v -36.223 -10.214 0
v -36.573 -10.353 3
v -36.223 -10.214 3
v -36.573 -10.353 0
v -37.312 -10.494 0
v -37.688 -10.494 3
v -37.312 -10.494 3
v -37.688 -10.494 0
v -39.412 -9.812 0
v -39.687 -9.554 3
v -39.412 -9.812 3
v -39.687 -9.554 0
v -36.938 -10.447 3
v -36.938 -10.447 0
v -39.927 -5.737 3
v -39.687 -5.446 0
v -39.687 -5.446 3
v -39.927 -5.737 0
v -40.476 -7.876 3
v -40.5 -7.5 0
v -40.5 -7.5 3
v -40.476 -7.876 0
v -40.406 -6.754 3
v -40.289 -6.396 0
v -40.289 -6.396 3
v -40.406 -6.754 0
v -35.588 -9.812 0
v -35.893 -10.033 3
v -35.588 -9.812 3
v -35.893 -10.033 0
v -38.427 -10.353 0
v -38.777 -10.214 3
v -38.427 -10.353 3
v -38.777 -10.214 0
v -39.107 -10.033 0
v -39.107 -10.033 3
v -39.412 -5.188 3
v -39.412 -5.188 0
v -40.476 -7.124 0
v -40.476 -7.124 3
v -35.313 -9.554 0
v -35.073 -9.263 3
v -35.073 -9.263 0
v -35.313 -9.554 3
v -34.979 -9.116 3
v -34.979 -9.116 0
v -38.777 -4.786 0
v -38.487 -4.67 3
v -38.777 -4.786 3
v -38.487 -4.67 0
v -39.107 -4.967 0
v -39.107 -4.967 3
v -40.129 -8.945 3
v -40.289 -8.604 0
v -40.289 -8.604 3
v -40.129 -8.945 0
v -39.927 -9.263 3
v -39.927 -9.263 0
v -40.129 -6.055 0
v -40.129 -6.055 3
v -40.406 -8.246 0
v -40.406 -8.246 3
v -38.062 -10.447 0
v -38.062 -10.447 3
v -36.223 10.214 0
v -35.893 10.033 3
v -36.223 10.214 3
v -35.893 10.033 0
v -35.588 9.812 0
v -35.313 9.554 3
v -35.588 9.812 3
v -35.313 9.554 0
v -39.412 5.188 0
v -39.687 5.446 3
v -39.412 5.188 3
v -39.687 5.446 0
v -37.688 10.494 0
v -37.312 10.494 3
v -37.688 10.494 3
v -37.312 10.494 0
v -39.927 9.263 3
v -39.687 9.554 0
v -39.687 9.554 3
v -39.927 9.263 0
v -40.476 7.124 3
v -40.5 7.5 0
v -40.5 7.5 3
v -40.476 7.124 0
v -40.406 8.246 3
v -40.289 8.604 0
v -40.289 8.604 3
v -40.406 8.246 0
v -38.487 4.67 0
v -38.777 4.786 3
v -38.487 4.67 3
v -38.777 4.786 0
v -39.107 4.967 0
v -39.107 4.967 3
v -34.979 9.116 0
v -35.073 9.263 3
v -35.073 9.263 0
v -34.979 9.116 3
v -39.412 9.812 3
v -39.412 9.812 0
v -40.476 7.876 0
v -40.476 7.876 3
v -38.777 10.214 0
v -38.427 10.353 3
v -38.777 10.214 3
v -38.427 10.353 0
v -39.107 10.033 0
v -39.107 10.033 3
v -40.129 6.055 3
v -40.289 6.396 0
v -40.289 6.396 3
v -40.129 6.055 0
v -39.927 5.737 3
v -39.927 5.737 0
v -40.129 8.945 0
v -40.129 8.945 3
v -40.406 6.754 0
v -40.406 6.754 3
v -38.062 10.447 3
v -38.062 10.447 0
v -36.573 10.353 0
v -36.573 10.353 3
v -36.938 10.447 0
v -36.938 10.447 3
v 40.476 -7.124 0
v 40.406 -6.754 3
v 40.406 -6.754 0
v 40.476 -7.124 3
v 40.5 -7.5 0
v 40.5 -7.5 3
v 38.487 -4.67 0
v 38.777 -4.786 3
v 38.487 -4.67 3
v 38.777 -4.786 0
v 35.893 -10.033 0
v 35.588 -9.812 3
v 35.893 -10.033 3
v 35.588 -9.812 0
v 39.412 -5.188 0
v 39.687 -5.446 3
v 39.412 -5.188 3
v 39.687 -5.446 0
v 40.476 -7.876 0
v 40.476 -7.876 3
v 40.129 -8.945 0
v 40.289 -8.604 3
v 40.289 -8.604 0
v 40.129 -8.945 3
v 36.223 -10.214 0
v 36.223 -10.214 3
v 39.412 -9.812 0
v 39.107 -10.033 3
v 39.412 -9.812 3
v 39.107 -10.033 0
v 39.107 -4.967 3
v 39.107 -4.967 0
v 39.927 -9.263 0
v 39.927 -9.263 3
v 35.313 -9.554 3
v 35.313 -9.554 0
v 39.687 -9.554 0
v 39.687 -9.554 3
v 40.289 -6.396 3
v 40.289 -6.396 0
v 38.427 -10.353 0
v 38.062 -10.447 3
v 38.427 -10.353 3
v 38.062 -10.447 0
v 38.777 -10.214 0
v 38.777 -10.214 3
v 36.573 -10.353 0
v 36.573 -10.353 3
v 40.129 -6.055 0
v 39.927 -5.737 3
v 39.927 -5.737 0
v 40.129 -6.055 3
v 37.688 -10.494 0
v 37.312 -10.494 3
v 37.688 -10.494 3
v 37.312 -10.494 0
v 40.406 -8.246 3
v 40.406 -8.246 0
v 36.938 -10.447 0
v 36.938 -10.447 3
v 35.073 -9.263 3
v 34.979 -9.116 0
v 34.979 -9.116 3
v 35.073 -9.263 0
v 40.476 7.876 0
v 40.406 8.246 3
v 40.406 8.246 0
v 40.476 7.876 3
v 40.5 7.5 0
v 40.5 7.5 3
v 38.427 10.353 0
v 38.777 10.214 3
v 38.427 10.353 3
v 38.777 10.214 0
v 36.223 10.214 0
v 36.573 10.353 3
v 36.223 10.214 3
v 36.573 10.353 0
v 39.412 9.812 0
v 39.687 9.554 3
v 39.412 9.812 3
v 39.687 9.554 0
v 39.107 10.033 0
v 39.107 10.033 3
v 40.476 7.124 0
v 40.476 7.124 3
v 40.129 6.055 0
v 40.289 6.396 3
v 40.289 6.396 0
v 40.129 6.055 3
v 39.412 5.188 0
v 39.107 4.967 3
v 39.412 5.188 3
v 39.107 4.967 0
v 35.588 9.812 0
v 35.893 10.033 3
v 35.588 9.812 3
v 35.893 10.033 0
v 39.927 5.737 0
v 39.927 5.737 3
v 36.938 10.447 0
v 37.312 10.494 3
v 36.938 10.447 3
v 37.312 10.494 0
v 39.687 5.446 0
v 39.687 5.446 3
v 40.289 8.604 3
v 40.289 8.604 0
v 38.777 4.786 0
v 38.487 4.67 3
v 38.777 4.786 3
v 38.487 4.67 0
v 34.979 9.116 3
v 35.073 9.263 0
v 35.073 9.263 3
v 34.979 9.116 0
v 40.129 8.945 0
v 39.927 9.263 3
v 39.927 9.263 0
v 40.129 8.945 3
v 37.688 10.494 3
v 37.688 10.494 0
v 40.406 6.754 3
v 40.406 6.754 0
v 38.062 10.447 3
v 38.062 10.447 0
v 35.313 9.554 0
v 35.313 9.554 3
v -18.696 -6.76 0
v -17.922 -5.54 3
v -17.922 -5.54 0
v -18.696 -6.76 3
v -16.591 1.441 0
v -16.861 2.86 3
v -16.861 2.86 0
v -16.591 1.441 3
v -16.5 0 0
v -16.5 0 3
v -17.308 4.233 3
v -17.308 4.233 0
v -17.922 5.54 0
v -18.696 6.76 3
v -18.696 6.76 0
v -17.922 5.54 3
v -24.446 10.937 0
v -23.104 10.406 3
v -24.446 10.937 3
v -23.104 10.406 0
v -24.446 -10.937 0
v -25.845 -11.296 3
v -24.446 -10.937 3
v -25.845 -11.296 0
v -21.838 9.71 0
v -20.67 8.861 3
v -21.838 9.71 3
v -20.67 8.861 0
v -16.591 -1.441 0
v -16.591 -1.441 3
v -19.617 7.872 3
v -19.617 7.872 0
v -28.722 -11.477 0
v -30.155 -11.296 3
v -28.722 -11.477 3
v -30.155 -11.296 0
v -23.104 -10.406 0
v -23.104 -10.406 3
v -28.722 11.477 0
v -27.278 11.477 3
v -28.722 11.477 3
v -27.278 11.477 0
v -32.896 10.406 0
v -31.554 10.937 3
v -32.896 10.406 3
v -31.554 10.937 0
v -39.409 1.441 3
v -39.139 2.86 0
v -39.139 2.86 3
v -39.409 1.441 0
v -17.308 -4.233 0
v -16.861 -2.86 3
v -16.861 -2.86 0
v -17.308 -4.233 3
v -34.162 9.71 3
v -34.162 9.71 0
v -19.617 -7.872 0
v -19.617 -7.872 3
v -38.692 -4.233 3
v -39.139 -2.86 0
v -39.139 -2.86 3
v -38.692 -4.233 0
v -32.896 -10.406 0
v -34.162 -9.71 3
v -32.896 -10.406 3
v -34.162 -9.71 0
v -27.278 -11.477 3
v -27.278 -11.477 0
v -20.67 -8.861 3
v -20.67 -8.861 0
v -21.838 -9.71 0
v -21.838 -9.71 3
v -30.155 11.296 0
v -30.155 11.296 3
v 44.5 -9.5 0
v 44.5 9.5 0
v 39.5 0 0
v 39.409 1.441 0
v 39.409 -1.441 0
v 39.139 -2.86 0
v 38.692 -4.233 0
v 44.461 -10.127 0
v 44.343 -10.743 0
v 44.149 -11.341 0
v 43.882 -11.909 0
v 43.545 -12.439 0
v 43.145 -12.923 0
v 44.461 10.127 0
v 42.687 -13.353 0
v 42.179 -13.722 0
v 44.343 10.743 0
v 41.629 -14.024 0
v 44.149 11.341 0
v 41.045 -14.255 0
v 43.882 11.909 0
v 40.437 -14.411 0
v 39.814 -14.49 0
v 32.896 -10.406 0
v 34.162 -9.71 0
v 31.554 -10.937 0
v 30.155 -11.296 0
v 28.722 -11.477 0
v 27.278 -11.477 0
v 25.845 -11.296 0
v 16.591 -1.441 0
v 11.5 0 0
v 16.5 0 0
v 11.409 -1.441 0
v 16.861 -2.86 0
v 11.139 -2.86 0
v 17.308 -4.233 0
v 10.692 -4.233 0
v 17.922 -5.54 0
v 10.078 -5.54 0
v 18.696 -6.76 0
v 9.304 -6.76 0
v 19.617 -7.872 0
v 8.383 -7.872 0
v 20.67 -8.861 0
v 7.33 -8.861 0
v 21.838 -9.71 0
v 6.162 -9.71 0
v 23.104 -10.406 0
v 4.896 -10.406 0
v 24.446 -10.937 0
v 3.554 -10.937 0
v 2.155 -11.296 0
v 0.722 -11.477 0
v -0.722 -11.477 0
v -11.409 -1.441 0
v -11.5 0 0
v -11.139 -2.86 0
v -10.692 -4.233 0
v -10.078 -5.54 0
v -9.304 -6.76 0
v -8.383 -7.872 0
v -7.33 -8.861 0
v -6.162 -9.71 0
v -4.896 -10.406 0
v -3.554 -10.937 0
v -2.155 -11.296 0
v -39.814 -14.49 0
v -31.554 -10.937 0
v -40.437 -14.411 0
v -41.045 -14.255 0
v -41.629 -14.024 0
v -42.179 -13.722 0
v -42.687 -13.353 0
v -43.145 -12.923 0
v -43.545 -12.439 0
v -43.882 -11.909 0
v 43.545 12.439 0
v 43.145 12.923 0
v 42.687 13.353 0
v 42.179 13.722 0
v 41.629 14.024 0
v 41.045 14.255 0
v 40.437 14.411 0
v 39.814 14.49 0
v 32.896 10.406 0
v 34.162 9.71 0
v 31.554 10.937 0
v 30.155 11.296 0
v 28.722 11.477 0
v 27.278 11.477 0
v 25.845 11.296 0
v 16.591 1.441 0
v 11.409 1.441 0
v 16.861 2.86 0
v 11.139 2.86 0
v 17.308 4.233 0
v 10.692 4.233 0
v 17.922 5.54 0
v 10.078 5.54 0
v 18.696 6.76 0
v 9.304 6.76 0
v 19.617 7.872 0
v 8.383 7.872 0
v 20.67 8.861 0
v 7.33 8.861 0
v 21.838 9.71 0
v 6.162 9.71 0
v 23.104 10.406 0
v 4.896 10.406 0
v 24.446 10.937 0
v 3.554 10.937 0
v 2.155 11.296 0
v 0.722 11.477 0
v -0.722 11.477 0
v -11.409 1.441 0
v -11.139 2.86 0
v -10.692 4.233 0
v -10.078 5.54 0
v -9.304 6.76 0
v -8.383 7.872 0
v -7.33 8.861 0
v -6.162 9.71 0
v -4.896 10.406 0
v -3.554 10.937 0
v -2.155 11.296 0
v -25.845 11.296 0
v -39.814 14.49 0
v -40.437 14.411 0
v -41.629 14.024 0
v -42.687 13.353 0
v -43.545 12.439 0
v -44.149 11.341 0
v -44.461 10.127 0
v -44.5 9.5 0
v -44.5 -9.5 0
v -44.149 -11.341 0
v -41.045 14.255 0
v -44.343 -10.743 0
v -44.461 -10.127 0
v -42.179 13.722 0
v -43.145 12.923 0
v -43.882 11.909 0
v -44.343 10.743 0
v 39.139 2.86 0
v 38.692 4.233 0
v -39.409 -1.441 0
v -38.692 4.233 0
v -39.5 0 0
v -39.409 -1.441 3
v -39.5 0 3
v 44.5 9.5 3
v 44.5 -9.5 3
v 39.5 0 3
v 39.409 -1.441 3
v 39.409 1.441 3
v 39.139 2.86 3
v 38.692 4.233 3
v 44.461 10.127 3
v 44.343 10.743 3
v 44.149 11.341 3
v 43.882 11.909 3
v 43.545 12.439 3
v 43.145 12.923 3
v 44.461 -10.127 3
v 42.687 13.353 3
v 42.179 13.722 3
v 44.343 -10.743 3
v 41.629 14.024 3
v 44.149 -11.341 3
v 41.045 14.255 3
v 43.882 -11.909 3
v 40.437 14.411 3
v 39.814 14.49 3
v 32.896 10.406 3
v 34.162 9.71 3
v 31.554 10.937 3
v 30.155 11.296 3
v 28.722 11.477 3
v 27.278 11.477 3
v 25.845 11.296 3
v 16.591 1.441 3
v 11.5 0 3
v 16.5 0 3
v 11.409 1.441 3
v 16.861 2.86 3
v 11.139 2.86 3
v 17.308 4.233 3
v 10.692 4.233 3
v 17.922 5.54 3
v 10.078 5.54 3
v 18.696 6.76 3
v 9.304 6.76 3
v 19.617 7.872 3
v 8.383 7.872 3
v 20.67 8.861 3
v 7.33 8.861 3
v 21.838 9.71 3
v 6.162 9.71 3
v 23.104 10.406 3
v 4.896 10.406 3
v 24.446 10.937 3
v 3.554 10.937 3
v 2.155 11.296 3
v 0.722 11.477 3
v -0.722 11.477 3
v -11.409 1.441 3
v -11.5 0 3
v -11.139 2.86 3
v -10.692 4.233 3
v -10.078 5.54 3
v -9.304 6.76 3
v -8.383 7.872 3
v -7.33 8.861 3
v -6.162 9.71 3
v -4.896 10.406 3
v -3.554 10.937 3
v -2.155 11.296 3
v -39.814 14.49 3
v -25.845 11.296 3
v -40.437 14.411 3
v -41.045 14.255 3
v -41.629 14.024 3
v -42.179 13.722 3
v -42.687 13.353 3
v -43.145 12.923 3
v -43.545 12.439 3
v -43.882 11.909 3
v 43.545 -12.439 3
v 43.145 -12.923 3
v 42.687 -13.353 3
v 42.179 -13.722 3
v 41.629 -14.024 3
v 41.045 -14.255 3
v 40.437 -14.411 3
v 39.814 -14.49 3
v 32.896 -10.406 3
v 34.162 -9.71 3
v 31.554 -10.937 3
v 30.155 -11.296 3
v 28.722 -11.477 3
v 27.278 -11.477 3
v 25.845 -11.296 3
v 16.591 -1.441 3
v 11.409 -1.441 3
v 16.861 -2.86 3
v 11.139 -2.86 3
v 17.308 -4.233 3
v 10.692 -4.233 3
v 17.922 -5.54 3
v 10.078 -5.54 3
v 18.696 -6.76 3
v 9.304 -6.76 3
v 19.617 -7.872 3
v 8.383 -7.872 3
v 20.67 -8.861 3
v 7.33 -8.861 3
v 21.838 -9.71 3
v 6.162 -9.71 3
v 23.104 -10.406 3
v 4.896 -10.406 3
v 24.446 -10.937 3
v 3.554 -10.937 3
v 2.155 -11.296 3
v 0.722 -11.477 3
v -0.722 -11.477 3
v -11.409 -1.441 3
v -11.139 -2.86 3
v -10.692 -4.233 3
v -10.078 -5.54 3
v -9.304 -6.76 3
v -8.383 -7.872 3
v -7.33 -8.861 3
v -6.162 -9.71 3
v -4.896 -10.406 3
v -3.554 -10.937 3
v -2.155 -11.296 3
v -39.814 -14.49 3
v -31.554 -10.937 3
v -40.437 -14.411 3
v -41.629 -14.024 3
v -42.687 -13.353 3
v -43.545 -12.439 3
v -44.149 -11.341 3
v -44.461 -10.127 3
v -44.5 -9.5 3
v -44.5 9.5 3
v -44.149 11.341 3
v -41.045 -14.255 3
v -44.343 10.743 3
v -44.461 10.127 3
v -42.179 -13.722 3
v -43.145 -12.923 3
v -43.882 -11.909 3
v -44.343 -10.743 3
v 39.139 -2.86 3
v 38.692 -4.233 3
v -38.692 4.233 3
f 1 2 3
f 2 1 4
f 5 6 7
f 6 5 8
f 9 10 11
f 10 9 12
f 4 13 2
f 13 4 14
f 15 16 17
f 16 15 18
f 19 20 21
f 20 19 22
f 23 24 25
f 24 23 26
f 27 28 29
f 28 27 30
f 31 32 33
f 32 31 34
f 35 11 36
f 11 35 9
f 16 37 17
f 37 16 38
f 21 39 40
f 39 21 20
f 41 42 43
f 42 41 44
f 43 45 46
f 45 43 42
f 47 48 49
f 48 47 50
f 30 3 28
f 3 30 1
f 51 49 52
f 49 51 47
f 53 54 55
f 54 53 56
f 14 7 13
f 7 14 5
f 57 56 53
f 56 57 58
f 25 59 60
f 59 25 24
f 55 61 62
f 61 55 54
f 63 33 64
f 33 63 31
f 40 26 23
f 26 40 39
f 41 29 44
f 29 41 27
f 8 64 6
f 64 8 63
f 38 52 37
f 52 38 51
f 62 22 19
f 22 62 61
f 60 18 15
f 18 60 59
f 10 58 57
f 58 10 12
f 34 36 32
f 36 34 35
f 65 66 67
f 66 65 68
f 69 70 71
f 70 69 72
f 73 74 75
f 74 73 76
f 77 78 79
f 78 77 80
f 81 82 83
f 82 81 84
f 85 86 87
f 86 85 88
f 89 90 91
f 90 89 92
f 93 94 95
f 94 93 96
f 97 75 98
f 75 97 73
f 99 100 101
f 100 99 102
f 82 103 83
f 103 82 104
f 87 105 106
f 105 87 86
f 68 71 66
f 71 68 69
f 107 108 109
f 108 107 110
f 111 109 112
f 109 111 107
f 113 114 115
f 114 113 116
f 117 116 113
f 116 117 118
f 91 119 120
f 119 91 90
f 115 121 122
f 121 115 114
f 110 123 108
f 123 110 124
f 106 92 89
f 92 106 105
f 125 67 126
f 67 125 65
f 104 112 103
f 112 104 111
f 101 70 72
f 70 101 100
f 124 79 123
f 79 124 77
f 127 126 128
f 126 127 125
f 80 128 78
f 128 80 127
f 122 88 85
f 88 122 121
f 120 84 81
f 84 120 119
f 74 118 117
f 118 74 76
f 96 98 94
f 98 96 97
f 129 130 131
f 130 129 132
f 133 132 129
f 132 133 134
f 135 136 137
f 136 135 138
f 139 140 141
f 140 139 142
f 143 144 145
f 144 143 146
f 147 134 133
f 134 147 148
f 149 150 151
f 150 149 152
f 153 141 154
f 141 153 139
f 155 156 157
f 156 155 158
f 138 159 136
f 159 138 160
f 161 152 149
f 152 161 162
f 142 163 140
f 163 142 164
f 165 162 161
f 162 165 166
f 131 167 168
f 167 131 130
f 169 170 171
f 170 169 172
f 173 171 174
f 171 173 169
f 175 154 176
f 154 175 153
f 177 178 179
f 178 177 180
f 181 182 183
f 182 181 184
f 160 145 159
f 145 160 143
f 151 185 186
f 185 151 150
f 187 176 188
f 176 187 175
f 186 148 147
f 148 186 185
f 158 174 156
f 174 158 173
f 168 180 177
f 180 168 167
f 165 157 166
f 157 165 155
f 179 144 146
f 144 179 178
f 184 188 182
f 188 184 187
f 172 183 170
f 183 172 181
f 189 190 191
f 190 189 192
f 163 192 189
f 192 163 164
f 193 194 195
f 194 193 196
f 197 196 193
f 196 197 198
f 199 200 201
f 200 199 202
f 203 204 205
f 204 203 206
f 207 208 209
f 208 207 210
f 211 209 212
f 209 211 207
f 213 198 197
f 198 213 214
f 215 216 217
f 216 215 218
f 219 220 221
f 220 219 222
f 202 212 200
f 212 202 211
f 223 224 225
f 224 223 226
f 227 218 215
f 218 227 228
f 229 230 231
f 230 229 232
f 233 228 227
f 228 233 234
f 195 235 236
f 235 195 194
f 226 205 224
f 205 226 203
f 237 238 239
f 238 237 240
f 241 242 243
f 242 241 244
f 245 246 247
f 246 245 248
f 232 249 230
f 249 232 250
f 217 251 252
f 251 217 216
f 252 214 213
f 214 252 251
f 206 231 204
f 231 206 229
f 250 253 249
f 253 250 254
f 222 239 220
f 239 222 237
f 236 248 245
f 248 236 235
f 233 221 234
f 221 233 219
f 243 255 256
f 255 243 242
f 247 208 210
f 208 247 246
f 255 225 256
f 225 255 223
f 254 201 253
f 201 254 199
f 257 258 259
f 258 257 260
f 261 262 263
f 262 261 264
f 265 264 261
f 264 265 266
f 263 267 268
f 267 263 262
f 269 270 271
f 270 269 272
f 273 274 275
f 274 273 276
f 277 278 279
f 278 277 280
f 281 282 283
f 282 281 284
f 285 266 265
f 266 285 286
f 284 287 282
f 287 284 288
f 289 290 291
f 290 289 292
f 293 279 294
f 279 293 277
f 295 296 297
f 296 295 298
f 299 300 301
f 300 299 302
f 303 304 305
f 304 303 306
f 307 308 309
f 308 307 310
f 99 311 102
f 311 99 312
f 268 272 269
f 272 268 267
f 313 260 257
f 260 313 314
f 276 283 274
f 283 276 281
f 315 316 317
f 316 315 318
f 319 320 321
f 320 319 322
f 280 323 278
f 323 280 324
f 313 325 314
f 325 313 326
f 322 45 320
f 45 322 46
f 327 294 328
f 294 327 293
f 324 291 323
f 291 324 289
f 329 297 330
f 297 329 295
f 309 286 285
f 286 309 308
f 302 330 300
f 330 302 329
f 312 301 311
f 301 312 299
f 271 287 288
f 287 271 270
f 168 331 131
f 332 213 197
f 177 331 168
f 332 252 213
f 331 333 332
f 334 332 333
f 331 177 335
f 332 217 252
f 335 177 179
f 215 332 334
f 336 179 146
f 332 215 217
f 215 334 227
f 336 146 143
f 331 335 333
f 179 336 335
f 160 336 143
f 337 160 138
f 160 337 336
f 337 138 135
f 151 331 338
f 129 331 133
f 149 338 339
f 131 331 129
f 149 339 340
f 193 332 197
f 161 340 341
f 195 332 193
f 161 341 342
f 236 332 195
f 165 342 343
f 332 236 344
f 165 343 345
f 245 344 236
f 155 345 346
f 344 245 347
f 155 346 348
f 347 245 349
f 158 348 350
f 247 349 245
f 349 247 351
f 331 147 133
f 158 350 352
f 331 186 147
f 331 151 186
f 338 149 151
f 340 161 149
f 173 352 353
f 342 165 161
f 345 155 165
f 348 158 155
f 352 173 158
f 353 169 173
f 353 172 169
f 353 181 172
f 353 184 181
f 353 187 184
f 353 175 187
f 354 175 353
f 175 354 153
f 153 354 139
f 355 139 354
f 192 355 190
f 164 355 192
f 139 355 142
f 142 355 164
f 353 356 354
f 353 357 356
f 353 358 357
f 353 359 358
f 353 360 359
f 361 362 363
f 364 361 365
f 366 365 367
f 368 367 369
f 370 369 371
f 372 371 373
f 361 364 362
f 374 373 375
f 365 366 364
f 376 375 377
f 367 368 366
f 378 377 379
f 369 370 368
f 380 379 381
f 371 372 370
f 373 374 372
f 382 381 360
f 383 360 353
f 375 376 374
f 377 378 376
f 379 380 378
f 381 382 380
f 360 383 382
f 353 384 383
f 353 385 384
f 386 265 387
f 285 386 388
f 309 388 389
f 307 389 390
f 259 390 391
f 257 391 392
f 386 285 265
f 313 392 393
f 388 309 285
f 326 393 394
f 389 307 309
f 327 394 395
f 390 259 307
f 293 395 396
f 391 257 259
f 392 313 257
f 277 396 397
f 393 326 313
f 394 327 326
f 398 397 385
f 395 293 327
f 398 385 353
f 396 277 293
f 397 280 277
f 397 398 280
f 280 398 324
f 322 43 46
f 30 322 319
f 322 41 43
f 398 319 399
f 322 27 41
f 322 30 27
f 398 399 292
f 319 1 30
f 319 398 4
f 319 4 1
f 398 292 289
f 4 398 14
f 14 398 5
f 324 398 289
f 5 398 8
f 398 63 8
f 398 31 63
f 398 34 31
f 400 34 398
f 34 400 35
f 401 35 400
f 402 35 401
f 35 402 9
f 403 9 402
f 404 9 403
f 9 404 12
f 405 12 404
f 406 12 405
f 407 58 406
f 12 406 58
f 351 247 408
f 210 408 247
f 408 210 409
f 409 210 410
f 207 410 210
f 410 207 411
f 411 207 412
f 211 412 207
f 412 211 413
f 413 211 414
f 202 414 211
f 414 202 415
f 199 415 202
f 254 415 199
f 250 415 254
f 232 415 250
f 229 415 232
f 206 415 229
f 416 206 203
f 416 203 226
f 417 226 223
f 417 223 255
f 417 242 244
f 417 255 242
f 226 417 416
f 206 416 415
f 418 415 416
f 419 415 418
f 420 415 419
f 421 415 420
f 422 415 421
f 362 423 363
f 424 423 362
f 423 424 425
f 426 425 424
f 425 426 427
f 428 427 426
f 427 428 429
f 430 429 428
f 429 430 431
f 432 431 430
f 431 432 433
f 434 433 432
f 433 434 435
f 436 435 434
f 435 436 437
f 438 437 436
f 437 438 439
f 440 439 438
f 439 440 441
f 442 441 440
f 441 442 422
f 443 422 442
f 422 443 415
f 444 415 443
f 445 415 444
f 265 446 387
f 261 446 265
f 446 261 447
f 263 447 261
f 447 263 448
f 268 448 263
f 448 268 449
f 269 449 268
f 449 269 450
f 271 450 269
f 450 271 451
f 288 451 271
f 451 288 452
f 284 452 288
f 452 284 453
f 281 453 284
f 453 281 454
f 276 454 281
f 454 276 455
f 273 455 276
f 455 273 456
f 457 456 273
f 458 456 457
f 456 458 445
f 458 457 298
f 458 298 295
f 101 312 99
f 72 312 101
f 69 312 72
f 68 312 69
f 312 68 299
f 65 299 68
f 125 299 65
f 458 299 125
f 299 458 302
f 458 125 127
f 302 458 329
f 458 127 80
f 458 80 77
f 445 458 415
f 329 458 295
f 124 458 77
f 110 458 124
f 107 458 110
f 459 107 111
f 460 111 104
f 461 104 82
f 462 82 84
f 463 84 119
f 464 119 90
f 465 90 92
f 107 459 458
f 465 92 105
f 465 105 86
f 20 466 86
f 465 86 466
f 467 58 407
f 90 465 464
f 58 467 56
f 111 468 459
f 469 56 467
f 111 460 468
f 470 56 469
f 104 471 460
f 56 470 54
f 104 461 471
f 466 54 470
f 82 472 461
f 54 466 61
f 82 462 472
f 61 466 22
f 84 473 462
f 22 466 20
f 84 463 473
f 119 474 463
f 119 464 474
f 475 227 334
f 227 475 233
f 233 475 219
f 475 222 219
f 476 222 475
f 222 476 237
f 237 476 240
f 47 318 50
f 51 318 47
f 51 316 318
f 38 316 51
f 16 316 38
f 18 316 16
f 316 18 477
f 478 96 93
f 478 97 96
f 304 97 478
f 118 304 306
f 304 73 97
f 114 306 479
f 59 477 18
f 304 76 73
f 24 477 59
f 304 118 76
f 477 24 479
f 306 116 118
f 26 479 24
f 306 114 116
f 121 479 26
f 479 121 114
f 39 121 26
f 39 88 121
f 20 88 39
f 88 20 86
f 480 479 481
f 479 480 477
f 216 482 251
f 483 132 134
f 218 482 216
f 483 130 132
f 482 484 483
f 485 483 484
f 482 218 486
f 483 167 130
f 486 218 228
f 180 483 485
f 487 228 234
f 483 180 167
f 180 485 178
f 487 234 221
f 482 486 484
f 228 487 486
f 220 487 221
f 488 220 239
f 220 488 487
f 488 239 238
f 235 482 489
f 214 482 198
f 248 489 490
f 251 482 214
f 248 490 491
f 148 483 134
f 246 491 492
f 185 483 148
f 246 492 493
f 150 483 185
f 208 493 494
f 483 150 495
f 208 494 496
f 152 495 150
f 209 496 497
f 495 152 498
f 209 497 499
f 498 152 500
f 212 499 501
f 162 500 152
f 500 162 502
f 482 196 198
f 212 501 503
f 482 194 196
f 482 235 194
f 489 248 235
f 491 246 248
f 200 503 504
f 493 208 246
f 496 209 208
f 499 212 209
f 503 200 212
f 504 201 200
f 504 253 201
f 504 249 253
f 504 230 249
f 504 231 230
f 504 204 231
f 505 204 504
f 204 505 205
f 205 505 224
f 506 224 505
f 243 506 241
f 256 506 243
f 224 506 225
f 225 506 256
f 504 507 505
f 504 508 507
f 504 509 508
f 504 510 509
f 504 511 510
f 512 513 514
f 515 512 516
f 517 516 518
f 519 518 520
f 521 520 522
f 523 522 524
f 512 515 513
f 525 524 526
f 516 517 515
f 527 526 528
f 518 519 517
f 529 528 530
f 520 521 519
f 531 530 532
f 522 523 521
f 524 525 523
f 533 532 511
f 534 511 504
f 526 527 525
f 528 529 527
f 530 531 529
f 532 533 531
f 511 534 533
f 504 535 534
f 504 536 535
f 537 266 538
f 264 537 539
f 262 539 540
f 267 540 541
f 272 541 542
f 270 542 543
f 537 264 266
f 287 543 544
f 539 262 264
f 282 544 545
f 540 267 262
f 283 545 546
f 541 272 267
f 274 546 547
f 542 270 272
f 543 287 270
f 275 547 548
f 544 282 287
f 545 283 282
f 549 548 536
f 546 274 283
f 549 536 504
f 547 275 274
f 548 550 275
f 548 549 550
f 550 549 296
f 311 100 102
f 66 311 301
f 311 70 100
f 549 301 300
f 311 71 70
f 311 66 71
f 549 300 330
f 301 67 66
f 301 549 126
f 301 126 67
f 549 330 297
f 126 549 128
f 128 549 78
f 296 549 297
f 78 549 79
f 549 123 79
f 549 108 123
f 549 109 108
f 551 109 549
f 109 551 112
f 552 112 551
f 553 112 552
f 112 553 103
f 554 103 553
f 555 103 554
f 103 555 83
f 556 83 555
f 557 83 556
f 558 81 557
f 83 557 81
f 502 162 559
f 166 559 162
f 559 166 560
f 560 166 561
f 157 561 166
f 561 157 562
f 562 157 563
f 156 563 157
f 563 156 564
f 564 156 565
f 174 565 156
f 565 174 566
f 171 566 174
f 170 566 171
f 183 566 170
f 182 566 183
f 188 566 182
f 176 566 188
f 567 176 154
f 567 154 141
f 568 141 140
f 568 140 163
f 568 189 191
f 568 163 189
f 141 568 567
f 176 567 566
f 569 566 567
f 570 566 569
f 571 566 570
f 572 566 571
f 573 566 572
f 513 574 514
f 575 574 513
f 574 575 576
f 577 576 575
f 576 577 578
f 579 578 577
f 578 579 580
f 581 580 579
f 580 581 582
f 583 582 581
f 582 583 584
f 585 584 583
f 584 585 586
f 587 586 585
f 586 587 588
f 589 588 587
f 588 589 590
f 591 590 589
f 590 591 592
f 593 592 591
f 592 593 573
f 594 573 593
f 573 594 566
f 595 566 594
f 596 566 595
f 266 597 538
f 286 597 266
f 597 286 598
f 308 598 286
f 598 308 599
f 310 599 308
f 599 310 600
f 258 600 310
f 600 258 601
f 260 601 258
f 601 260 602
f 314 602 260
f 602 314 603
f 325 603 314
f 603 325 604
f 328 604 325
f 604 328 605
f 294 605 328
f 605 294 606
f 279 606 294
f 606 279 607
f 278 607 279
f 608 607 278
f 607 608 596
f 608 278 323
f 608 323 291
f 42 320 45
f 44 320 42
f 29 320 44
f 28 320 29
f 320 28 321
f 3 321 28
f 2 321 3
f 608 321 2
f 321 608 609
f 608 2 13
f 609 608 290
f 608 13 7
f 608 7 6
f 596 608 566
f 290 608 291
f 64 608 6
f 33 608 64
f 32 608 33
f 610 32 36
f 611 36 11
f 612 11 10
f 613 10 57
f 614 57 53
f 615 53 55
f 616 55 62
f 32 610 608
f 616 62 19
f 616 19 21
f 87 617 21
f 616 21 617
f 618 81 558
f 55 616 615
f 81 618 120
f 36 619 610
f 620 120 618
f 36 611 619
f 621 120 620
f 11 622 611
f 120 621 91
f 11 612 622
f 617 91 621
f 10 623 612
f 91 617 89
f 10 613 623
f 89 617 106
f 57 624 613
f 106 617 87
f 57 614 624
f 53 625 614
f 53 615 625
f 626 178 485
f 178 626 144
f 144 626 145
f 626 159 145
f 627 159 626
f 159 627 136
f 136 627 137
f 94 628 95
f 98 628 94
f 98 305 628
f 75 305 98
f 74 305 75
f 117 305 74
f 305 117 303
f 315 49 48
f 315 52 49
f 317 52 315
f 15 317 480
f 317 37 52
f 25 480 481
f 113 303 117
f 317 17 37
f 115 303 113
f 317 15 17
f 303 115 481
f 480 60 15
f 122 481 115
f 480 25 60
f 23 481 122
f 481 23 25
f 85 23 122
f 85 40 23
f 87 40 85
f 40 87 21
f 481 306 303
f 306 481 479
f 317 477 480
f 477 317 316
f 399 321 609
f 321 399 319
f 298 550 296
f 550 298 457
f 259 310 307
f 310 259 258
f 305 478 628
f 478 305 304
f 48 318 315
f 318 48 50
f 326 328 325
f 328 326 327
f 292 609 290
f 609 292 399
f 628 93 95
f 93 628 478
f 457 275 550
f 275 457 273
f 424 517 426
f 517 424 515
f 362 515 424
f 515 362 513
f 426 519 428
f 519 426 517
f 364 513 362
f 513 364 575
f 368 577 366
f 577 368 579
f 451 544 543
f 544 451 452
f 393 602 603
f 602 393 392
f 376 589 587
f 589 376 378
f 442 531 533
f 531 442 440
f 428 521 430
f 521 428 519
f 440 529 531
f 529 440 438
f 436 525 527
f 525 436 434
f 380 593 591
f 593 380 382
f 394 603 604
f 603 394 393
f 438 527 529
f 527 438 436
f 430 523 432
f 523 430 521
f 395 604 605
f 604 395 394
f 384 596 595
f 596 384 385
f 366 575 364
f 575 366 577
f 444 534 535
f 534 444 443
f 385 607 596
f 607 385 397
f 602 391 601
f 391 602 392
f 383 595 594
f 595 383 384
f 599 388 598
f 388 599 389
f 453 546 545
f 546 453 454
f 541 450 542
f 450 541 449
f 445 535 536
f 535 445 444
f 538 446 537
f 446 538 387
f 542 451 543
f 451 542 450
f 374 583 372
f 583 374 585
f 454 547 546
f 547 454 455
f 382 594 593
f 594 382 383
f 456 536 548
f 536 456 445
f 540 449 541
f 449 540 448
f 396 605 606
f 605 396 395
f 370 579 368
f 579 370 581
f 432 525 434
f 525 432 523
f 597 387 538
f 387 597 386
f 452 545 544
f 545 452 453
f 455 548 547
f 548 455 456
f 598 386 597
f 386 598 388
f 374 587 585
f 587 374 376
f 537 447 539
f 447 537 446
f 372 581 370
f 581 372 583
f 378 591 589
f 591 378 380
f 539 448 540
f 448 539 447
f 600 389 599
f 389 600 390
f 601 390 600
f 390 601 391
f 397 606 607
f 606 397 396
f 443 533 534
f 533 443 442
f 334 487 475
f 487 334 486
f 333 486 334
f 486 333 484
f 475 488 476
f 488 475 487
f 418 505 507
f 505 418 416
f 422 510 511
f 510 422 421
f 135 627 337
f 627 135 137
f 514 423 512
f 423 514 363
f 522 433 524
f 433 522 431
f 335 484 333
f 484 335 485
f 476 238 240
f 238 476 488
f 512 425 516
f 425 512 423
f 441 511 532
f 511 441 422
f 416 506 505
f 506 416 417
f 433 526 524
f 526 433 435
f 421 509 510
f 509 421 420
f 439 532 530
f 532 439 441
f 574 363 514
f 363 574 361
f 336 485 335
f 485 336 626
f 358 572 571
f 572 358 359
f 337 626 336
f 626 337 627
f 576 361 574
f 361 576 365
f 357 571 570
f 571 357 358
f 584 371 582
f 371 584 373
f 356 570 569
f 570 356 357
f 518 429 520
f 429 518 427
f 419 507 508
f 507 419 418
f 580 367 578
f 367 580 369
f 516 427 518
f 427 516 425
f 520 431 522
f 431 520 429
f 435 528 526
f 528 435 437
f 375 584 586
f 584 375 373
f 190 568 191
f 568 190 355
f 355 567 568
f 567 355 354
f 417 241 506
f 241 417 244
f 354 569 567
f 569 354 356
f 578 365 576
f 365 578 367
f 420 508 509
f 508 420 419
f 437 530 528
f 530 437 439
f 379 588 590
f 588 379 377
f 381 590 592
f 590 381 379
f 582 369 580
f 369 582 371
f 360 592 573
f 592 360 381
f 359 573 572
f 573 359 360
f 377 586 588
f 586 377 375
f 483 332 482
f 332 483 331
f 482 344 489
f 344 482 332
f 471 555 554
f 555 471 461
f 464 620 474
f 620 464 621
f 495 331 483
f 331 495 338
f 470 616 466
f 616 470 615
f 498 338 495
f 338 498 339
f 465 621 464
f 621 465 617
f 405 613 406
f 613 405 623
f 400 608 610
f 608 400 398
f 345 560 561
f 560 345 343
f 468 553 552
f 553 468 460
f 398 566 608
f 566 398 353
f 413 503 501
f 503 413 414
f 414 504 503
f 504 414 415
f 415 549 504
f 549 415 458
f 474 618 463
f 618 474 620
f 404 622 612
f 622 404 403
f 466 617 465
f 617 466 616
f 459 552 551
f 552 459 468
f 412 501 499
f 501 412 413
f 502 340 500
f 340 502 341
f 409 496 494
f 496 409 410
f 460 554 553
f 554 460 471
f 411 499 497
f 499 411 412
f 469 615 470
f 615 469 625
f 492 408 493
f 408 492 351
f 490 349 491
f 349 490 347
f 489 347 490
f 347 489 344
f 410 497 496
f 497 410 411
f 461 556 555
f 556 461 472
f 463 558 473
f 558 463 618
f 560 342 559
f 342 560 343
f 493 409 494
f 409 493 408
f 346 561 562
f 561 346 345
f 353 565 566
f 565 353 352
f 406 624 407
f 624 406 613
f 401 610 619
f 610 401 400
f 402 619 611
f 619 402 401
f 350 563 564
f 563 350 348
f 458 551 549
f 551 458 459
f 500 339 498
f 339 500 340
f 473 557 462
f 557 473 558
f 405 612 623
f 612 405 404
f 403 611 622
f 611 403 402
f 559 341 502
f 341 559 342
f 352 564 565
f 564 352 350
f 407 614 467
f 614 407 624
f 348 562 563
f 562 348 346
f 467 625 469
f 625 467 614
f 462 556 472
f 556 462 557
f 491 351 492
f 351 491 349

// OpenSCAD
$fn = 50;


difference() {
	union() {
		hull() {
			translate(v = [-39.5000000000, 9.5000000000, 0]) {
				cylinder(h = 3, r = 5);
			}
			translate(v = [39.5000000000, 9.5000000000, 0]) {
				cylinder(h = 3, r = 5);
			}
			translate(v = [-39.5000000000, -9.5000000000, 0]) {
				cylinder(h = 3, r = 5);
			}
			translate(v = [39.5000000000, -9.5000000000, 0]) {
				cylinder(h = 3, r = 5);
			}
		}
	}
	union() {
		#translate(v = [-37.5000000000, -7.5000000000, -100.0000000000]) {
			cylinder(h = 200, r = 3.0000000000);
		}
		#translate(v = [-37.5000000000, 7.5000000000, -100.0000000000]) {
			cylinder(h = 200, r = 3.0000000000);
		}
		#translate(v = [37.5000000000, -7.5000000000, -100.0000000000]) {
			cylinder(h = 200, r = 3.0000000000);
		}
		#translate(v = [37.5000000000, 7.5000000000, -100.0000000000]) {
			cylinder(h = 200, r = 3.0000000000);
		}
		#translate(v = [-28.0000000000, 0, 0]) {
			cylinder(h = 3, r = 11.5000000000);
		}
		#cylinder(h = 3, r = 11.5000000000);
		#translate(v = [28.0000000000, 0, 0]) {
			cylinder(h = 3, r = 11.5000000000);
		}
	}
}
